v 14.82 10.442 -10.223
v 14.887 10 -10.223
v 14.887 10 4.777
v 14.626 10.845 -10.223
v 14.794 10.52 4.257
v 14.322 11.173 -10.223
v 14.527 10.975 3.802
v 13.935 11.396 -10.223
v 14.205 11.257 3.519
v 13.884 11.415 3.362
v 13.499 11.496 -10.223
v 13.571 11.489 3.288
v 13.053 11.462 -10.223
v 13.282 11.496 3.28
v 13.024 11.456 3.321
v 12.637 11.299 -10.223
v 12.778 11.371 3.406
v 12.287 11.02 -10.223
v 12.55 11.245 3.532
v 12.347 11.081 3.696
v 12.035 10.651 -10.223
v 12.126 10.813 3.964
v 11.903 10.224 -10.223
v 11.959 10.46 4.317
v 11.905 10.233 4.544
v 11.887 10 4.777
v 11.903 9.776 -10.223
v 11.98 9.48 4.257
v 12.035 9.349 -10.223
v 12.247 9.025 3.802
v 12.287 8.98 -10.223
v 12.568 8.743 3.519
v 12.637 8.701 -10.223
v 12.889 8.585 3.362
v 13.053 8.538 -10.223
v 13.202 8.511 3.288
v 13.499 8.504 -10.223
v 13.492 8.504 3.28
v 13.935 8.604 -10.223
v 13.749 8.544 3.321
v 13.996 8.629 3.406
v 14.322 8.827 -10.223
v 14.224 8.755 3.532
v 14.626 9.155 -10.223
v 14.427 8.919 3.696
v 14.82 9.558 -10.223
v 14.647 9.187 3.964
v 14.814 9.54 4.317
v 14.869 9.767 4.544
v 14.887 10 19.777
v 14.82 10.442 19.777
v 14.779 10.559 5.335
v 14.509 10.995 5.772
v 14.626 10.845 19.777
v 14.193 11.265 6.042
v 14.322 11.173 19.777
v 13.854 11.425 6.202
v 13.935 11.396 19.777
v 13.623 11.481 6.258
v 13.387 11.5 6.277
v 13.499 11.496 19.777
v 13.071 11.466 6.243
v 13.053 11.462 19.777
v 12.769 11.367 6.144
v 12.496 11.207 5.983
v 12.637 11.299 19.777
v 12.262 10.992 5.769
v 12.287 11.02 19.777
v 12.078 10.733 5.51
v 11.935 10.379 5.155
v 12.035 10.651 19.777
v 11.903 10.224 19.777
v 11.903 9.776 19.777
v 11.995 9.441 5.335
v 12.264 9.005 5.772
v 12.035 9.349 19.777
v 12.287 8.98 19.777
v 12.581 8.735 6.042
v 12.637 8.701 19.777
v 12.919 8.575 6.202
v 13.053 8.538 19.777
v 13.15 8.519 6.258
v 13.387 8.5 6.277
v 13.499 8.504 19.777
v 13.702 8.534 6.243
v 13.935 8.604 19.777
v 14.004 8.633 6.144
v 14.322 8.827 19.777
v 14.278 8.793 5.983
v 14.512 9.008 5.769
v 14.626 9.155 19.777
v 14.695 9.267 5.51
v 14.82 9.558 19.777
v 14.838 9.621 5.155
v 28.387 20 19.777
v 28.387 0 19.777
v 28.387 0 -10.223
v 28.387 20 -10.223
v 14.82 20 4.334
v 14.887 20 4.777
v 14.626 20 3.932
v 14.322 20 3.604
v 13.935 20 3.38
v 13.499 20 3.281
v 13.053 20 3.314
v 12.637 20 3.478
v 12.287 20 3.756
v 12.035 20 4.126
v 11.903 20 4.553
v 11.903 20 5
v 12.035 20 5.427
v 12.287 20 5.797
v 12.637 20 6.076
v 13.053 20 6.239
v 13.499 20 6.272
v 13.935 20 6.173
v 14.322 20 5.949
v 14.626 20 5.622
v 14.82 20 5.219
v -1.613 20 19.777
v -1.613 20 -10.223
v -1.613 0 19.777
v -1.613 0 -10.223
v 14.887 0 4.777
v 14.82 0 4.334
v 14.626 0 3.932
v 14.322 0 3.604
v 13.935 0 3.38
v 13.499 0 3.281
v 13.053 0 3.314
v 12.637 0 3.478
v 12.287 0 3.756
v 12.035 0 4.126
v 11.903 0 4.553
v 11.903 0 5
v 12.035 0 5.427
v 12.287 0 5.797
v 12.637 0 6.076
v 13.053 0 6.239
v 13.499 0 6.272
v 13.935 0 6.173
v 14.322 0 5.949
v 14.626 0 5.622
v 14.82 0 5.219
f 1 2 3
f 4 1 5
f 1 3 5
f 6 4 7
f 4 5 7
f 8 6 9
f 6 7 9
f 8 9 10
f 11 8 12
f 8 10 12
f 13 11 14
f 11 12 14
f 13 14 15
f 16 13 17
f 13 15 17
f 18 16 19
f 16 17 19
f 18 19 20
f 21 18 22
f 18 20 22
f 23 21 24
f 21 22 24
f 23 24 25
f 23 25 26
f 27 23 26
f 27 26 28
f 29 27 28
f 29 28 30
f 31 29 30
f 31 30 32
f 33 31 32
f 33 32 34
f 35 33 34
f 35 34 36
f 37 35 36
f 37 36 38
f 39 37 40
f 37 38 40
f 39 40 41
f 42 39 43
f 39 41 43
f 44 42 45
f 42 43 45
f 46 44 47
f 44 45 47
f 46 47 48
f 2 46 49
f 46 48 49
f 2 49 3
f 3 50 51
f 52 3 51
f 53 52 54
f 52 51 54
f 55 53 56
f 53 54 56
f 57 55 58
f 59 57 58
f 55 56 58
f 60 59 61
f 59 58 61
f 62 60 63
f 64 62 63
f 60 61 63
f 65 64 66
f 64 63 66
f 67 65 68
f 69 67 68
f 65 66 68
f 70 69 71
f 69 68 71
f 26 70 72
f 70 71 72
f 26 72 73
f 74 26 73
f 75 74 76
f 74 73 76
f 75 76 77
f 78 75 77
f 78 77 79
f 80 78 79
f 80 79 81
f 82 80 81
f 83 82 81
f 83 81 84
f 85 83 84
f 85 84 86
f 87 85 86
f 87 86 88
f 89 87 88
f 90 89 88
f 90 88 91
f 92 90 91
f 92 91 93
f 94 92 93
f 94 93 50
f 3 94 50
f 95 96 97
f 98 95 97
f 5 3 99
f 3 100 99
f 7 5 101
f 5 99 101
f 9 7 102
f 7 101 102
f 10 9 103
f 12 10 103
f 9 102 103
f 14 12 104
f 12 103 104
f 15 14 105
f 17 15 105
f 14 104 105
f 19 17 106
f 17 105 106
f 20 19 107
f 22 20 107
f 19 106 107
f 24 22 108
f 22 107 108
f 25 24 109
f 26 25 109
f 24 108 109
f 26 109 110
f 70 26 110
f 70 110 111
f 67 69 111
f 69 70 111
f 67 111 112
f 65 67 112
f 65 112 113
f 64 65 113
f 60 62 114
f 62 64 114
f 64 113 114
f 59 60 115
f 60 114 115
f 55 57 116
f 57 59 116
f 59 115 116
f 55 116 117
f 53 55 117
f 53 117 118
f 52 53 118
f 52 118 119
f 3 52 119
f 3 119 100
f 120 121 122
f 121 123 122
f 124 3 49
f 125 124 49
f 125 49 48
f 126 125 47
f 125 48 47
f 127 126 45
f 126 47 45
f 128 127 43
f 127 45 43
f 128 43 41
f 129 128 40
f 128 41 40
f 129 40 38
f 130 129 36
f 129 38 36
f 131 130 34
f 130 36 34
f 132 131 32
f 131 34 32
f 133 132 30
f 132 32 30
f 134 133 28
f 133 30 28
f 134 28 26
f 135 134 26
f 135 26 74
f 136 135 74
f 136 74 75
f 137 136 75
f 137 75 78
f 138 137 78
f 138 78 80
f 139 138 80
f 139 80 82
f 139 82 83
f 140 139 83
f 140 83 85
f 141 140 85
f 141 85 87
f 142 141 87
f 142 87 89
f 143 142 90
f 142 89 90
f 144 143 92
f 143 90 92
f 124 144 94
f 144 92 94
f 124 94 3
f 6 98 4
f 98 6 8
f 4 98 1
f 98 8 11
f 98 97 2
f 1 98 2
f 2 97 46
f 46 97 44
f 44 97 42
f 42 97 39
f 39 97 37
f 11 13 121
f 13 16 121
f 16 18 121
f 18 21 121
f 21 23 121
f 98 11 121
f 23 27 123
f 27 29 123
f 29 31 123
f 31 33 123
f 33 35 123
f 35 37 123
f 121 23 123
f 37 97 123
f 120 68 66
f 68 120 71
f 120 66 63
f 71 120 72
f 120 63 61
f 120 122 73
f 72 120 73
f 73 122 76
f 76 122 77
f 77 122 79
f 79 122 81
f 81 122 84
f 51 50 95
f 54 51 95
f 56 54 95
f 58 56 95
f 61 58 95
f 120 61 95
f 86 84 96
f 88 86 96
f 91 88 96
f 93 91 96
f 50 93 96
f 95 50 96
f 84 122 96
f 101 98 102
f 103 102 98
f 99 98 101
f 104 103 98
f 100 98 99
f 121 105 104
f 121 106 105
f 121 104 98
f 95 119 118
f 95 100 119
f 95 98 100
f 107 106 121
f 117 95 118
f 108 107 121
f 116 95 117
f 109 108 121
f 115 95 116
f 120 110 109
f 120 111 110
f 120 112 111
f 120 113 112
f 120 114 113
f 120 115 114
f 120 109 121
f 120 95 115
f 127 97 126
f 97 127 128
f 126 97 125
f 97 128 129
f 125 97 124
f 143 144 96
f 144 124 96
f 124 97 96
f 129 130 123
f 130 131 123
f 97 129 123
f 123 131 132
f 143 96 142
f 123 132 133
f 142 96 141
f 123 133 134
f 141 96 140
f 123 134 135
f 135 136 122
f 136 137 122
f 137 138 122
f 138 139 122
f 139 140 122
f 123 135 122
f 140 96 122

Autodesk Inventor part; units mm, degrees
ref_plane "YZ Plane" through (0, 0, 0) normal (1, 0, 0) x (0, 1, 0)
ref_plane "XZ Plane" through (0, 0, 0) normal (0, 1, 0) x (-1, 0, 0)
ref_plane "XY Plane" through (0, 0, 0) normal (0, 0, 1) x (1, 0, 0)
sketch "Sketch1" plane through (0, 0, 0) normal (0, 1, 0) x (-1, 0, 0)
  line L0 (1.6133, 19.7766) -> (-28.3867, 19.7766)
  line L1 (-28.3867, 19.7766) -> (-28.3867, -10.2234)
  line L2 (-28.3867, -10.2234) -> (1.6133, -10.2234)
  line L3 (1.6133, -10.2234) -> (1.6133, 19.7766)
  point P0 (0, 0)
  dimension "d0" = 30
  dimension "d1" = 30
extrude "Extrusion1" add sketch "Sketch1" along normal blind 20
sketch "Sketch2" plane through (-1.6133, 0, 19.7766) normal (0, 0, 1) x (1, 0, 0)
  circle A0 centre (15, 10) radius 1.5
  line L0 (0, 0) -> (30, 0) projected
  line L1 (0, 0) -> (0, 20) projected
  point P0 (1.6133, 0)
  point P1 (0, 10)
  dimension "d4" = 3
  dimension "d5" = 10
  dimension "d6" = 15
extrude "Extrusion2" cut sketch "Sketch2" against normal blind 500
sketch "Sketch3" plane through (0, 20, 0) normal (0, 1, 0) x (1, 0, 0)
  circle A0 centre (13.3867, -4.7766) radius 1.5
  line L0 (28.3867, -19.7766) -> (28.3867, 10.2234) projected
  line L1 (28.3867, 10.2234) -> (-1.6133, 10.2234) projected
  point P0 (0, 0)
  dimension "d9" = 3
  dimension "d10" = 15
  dimension "d11" = 15
extrude "Extrusion3" cut sketch "Sketch3" against normal blind 500
properties part number "fengmingroboticarm2"
